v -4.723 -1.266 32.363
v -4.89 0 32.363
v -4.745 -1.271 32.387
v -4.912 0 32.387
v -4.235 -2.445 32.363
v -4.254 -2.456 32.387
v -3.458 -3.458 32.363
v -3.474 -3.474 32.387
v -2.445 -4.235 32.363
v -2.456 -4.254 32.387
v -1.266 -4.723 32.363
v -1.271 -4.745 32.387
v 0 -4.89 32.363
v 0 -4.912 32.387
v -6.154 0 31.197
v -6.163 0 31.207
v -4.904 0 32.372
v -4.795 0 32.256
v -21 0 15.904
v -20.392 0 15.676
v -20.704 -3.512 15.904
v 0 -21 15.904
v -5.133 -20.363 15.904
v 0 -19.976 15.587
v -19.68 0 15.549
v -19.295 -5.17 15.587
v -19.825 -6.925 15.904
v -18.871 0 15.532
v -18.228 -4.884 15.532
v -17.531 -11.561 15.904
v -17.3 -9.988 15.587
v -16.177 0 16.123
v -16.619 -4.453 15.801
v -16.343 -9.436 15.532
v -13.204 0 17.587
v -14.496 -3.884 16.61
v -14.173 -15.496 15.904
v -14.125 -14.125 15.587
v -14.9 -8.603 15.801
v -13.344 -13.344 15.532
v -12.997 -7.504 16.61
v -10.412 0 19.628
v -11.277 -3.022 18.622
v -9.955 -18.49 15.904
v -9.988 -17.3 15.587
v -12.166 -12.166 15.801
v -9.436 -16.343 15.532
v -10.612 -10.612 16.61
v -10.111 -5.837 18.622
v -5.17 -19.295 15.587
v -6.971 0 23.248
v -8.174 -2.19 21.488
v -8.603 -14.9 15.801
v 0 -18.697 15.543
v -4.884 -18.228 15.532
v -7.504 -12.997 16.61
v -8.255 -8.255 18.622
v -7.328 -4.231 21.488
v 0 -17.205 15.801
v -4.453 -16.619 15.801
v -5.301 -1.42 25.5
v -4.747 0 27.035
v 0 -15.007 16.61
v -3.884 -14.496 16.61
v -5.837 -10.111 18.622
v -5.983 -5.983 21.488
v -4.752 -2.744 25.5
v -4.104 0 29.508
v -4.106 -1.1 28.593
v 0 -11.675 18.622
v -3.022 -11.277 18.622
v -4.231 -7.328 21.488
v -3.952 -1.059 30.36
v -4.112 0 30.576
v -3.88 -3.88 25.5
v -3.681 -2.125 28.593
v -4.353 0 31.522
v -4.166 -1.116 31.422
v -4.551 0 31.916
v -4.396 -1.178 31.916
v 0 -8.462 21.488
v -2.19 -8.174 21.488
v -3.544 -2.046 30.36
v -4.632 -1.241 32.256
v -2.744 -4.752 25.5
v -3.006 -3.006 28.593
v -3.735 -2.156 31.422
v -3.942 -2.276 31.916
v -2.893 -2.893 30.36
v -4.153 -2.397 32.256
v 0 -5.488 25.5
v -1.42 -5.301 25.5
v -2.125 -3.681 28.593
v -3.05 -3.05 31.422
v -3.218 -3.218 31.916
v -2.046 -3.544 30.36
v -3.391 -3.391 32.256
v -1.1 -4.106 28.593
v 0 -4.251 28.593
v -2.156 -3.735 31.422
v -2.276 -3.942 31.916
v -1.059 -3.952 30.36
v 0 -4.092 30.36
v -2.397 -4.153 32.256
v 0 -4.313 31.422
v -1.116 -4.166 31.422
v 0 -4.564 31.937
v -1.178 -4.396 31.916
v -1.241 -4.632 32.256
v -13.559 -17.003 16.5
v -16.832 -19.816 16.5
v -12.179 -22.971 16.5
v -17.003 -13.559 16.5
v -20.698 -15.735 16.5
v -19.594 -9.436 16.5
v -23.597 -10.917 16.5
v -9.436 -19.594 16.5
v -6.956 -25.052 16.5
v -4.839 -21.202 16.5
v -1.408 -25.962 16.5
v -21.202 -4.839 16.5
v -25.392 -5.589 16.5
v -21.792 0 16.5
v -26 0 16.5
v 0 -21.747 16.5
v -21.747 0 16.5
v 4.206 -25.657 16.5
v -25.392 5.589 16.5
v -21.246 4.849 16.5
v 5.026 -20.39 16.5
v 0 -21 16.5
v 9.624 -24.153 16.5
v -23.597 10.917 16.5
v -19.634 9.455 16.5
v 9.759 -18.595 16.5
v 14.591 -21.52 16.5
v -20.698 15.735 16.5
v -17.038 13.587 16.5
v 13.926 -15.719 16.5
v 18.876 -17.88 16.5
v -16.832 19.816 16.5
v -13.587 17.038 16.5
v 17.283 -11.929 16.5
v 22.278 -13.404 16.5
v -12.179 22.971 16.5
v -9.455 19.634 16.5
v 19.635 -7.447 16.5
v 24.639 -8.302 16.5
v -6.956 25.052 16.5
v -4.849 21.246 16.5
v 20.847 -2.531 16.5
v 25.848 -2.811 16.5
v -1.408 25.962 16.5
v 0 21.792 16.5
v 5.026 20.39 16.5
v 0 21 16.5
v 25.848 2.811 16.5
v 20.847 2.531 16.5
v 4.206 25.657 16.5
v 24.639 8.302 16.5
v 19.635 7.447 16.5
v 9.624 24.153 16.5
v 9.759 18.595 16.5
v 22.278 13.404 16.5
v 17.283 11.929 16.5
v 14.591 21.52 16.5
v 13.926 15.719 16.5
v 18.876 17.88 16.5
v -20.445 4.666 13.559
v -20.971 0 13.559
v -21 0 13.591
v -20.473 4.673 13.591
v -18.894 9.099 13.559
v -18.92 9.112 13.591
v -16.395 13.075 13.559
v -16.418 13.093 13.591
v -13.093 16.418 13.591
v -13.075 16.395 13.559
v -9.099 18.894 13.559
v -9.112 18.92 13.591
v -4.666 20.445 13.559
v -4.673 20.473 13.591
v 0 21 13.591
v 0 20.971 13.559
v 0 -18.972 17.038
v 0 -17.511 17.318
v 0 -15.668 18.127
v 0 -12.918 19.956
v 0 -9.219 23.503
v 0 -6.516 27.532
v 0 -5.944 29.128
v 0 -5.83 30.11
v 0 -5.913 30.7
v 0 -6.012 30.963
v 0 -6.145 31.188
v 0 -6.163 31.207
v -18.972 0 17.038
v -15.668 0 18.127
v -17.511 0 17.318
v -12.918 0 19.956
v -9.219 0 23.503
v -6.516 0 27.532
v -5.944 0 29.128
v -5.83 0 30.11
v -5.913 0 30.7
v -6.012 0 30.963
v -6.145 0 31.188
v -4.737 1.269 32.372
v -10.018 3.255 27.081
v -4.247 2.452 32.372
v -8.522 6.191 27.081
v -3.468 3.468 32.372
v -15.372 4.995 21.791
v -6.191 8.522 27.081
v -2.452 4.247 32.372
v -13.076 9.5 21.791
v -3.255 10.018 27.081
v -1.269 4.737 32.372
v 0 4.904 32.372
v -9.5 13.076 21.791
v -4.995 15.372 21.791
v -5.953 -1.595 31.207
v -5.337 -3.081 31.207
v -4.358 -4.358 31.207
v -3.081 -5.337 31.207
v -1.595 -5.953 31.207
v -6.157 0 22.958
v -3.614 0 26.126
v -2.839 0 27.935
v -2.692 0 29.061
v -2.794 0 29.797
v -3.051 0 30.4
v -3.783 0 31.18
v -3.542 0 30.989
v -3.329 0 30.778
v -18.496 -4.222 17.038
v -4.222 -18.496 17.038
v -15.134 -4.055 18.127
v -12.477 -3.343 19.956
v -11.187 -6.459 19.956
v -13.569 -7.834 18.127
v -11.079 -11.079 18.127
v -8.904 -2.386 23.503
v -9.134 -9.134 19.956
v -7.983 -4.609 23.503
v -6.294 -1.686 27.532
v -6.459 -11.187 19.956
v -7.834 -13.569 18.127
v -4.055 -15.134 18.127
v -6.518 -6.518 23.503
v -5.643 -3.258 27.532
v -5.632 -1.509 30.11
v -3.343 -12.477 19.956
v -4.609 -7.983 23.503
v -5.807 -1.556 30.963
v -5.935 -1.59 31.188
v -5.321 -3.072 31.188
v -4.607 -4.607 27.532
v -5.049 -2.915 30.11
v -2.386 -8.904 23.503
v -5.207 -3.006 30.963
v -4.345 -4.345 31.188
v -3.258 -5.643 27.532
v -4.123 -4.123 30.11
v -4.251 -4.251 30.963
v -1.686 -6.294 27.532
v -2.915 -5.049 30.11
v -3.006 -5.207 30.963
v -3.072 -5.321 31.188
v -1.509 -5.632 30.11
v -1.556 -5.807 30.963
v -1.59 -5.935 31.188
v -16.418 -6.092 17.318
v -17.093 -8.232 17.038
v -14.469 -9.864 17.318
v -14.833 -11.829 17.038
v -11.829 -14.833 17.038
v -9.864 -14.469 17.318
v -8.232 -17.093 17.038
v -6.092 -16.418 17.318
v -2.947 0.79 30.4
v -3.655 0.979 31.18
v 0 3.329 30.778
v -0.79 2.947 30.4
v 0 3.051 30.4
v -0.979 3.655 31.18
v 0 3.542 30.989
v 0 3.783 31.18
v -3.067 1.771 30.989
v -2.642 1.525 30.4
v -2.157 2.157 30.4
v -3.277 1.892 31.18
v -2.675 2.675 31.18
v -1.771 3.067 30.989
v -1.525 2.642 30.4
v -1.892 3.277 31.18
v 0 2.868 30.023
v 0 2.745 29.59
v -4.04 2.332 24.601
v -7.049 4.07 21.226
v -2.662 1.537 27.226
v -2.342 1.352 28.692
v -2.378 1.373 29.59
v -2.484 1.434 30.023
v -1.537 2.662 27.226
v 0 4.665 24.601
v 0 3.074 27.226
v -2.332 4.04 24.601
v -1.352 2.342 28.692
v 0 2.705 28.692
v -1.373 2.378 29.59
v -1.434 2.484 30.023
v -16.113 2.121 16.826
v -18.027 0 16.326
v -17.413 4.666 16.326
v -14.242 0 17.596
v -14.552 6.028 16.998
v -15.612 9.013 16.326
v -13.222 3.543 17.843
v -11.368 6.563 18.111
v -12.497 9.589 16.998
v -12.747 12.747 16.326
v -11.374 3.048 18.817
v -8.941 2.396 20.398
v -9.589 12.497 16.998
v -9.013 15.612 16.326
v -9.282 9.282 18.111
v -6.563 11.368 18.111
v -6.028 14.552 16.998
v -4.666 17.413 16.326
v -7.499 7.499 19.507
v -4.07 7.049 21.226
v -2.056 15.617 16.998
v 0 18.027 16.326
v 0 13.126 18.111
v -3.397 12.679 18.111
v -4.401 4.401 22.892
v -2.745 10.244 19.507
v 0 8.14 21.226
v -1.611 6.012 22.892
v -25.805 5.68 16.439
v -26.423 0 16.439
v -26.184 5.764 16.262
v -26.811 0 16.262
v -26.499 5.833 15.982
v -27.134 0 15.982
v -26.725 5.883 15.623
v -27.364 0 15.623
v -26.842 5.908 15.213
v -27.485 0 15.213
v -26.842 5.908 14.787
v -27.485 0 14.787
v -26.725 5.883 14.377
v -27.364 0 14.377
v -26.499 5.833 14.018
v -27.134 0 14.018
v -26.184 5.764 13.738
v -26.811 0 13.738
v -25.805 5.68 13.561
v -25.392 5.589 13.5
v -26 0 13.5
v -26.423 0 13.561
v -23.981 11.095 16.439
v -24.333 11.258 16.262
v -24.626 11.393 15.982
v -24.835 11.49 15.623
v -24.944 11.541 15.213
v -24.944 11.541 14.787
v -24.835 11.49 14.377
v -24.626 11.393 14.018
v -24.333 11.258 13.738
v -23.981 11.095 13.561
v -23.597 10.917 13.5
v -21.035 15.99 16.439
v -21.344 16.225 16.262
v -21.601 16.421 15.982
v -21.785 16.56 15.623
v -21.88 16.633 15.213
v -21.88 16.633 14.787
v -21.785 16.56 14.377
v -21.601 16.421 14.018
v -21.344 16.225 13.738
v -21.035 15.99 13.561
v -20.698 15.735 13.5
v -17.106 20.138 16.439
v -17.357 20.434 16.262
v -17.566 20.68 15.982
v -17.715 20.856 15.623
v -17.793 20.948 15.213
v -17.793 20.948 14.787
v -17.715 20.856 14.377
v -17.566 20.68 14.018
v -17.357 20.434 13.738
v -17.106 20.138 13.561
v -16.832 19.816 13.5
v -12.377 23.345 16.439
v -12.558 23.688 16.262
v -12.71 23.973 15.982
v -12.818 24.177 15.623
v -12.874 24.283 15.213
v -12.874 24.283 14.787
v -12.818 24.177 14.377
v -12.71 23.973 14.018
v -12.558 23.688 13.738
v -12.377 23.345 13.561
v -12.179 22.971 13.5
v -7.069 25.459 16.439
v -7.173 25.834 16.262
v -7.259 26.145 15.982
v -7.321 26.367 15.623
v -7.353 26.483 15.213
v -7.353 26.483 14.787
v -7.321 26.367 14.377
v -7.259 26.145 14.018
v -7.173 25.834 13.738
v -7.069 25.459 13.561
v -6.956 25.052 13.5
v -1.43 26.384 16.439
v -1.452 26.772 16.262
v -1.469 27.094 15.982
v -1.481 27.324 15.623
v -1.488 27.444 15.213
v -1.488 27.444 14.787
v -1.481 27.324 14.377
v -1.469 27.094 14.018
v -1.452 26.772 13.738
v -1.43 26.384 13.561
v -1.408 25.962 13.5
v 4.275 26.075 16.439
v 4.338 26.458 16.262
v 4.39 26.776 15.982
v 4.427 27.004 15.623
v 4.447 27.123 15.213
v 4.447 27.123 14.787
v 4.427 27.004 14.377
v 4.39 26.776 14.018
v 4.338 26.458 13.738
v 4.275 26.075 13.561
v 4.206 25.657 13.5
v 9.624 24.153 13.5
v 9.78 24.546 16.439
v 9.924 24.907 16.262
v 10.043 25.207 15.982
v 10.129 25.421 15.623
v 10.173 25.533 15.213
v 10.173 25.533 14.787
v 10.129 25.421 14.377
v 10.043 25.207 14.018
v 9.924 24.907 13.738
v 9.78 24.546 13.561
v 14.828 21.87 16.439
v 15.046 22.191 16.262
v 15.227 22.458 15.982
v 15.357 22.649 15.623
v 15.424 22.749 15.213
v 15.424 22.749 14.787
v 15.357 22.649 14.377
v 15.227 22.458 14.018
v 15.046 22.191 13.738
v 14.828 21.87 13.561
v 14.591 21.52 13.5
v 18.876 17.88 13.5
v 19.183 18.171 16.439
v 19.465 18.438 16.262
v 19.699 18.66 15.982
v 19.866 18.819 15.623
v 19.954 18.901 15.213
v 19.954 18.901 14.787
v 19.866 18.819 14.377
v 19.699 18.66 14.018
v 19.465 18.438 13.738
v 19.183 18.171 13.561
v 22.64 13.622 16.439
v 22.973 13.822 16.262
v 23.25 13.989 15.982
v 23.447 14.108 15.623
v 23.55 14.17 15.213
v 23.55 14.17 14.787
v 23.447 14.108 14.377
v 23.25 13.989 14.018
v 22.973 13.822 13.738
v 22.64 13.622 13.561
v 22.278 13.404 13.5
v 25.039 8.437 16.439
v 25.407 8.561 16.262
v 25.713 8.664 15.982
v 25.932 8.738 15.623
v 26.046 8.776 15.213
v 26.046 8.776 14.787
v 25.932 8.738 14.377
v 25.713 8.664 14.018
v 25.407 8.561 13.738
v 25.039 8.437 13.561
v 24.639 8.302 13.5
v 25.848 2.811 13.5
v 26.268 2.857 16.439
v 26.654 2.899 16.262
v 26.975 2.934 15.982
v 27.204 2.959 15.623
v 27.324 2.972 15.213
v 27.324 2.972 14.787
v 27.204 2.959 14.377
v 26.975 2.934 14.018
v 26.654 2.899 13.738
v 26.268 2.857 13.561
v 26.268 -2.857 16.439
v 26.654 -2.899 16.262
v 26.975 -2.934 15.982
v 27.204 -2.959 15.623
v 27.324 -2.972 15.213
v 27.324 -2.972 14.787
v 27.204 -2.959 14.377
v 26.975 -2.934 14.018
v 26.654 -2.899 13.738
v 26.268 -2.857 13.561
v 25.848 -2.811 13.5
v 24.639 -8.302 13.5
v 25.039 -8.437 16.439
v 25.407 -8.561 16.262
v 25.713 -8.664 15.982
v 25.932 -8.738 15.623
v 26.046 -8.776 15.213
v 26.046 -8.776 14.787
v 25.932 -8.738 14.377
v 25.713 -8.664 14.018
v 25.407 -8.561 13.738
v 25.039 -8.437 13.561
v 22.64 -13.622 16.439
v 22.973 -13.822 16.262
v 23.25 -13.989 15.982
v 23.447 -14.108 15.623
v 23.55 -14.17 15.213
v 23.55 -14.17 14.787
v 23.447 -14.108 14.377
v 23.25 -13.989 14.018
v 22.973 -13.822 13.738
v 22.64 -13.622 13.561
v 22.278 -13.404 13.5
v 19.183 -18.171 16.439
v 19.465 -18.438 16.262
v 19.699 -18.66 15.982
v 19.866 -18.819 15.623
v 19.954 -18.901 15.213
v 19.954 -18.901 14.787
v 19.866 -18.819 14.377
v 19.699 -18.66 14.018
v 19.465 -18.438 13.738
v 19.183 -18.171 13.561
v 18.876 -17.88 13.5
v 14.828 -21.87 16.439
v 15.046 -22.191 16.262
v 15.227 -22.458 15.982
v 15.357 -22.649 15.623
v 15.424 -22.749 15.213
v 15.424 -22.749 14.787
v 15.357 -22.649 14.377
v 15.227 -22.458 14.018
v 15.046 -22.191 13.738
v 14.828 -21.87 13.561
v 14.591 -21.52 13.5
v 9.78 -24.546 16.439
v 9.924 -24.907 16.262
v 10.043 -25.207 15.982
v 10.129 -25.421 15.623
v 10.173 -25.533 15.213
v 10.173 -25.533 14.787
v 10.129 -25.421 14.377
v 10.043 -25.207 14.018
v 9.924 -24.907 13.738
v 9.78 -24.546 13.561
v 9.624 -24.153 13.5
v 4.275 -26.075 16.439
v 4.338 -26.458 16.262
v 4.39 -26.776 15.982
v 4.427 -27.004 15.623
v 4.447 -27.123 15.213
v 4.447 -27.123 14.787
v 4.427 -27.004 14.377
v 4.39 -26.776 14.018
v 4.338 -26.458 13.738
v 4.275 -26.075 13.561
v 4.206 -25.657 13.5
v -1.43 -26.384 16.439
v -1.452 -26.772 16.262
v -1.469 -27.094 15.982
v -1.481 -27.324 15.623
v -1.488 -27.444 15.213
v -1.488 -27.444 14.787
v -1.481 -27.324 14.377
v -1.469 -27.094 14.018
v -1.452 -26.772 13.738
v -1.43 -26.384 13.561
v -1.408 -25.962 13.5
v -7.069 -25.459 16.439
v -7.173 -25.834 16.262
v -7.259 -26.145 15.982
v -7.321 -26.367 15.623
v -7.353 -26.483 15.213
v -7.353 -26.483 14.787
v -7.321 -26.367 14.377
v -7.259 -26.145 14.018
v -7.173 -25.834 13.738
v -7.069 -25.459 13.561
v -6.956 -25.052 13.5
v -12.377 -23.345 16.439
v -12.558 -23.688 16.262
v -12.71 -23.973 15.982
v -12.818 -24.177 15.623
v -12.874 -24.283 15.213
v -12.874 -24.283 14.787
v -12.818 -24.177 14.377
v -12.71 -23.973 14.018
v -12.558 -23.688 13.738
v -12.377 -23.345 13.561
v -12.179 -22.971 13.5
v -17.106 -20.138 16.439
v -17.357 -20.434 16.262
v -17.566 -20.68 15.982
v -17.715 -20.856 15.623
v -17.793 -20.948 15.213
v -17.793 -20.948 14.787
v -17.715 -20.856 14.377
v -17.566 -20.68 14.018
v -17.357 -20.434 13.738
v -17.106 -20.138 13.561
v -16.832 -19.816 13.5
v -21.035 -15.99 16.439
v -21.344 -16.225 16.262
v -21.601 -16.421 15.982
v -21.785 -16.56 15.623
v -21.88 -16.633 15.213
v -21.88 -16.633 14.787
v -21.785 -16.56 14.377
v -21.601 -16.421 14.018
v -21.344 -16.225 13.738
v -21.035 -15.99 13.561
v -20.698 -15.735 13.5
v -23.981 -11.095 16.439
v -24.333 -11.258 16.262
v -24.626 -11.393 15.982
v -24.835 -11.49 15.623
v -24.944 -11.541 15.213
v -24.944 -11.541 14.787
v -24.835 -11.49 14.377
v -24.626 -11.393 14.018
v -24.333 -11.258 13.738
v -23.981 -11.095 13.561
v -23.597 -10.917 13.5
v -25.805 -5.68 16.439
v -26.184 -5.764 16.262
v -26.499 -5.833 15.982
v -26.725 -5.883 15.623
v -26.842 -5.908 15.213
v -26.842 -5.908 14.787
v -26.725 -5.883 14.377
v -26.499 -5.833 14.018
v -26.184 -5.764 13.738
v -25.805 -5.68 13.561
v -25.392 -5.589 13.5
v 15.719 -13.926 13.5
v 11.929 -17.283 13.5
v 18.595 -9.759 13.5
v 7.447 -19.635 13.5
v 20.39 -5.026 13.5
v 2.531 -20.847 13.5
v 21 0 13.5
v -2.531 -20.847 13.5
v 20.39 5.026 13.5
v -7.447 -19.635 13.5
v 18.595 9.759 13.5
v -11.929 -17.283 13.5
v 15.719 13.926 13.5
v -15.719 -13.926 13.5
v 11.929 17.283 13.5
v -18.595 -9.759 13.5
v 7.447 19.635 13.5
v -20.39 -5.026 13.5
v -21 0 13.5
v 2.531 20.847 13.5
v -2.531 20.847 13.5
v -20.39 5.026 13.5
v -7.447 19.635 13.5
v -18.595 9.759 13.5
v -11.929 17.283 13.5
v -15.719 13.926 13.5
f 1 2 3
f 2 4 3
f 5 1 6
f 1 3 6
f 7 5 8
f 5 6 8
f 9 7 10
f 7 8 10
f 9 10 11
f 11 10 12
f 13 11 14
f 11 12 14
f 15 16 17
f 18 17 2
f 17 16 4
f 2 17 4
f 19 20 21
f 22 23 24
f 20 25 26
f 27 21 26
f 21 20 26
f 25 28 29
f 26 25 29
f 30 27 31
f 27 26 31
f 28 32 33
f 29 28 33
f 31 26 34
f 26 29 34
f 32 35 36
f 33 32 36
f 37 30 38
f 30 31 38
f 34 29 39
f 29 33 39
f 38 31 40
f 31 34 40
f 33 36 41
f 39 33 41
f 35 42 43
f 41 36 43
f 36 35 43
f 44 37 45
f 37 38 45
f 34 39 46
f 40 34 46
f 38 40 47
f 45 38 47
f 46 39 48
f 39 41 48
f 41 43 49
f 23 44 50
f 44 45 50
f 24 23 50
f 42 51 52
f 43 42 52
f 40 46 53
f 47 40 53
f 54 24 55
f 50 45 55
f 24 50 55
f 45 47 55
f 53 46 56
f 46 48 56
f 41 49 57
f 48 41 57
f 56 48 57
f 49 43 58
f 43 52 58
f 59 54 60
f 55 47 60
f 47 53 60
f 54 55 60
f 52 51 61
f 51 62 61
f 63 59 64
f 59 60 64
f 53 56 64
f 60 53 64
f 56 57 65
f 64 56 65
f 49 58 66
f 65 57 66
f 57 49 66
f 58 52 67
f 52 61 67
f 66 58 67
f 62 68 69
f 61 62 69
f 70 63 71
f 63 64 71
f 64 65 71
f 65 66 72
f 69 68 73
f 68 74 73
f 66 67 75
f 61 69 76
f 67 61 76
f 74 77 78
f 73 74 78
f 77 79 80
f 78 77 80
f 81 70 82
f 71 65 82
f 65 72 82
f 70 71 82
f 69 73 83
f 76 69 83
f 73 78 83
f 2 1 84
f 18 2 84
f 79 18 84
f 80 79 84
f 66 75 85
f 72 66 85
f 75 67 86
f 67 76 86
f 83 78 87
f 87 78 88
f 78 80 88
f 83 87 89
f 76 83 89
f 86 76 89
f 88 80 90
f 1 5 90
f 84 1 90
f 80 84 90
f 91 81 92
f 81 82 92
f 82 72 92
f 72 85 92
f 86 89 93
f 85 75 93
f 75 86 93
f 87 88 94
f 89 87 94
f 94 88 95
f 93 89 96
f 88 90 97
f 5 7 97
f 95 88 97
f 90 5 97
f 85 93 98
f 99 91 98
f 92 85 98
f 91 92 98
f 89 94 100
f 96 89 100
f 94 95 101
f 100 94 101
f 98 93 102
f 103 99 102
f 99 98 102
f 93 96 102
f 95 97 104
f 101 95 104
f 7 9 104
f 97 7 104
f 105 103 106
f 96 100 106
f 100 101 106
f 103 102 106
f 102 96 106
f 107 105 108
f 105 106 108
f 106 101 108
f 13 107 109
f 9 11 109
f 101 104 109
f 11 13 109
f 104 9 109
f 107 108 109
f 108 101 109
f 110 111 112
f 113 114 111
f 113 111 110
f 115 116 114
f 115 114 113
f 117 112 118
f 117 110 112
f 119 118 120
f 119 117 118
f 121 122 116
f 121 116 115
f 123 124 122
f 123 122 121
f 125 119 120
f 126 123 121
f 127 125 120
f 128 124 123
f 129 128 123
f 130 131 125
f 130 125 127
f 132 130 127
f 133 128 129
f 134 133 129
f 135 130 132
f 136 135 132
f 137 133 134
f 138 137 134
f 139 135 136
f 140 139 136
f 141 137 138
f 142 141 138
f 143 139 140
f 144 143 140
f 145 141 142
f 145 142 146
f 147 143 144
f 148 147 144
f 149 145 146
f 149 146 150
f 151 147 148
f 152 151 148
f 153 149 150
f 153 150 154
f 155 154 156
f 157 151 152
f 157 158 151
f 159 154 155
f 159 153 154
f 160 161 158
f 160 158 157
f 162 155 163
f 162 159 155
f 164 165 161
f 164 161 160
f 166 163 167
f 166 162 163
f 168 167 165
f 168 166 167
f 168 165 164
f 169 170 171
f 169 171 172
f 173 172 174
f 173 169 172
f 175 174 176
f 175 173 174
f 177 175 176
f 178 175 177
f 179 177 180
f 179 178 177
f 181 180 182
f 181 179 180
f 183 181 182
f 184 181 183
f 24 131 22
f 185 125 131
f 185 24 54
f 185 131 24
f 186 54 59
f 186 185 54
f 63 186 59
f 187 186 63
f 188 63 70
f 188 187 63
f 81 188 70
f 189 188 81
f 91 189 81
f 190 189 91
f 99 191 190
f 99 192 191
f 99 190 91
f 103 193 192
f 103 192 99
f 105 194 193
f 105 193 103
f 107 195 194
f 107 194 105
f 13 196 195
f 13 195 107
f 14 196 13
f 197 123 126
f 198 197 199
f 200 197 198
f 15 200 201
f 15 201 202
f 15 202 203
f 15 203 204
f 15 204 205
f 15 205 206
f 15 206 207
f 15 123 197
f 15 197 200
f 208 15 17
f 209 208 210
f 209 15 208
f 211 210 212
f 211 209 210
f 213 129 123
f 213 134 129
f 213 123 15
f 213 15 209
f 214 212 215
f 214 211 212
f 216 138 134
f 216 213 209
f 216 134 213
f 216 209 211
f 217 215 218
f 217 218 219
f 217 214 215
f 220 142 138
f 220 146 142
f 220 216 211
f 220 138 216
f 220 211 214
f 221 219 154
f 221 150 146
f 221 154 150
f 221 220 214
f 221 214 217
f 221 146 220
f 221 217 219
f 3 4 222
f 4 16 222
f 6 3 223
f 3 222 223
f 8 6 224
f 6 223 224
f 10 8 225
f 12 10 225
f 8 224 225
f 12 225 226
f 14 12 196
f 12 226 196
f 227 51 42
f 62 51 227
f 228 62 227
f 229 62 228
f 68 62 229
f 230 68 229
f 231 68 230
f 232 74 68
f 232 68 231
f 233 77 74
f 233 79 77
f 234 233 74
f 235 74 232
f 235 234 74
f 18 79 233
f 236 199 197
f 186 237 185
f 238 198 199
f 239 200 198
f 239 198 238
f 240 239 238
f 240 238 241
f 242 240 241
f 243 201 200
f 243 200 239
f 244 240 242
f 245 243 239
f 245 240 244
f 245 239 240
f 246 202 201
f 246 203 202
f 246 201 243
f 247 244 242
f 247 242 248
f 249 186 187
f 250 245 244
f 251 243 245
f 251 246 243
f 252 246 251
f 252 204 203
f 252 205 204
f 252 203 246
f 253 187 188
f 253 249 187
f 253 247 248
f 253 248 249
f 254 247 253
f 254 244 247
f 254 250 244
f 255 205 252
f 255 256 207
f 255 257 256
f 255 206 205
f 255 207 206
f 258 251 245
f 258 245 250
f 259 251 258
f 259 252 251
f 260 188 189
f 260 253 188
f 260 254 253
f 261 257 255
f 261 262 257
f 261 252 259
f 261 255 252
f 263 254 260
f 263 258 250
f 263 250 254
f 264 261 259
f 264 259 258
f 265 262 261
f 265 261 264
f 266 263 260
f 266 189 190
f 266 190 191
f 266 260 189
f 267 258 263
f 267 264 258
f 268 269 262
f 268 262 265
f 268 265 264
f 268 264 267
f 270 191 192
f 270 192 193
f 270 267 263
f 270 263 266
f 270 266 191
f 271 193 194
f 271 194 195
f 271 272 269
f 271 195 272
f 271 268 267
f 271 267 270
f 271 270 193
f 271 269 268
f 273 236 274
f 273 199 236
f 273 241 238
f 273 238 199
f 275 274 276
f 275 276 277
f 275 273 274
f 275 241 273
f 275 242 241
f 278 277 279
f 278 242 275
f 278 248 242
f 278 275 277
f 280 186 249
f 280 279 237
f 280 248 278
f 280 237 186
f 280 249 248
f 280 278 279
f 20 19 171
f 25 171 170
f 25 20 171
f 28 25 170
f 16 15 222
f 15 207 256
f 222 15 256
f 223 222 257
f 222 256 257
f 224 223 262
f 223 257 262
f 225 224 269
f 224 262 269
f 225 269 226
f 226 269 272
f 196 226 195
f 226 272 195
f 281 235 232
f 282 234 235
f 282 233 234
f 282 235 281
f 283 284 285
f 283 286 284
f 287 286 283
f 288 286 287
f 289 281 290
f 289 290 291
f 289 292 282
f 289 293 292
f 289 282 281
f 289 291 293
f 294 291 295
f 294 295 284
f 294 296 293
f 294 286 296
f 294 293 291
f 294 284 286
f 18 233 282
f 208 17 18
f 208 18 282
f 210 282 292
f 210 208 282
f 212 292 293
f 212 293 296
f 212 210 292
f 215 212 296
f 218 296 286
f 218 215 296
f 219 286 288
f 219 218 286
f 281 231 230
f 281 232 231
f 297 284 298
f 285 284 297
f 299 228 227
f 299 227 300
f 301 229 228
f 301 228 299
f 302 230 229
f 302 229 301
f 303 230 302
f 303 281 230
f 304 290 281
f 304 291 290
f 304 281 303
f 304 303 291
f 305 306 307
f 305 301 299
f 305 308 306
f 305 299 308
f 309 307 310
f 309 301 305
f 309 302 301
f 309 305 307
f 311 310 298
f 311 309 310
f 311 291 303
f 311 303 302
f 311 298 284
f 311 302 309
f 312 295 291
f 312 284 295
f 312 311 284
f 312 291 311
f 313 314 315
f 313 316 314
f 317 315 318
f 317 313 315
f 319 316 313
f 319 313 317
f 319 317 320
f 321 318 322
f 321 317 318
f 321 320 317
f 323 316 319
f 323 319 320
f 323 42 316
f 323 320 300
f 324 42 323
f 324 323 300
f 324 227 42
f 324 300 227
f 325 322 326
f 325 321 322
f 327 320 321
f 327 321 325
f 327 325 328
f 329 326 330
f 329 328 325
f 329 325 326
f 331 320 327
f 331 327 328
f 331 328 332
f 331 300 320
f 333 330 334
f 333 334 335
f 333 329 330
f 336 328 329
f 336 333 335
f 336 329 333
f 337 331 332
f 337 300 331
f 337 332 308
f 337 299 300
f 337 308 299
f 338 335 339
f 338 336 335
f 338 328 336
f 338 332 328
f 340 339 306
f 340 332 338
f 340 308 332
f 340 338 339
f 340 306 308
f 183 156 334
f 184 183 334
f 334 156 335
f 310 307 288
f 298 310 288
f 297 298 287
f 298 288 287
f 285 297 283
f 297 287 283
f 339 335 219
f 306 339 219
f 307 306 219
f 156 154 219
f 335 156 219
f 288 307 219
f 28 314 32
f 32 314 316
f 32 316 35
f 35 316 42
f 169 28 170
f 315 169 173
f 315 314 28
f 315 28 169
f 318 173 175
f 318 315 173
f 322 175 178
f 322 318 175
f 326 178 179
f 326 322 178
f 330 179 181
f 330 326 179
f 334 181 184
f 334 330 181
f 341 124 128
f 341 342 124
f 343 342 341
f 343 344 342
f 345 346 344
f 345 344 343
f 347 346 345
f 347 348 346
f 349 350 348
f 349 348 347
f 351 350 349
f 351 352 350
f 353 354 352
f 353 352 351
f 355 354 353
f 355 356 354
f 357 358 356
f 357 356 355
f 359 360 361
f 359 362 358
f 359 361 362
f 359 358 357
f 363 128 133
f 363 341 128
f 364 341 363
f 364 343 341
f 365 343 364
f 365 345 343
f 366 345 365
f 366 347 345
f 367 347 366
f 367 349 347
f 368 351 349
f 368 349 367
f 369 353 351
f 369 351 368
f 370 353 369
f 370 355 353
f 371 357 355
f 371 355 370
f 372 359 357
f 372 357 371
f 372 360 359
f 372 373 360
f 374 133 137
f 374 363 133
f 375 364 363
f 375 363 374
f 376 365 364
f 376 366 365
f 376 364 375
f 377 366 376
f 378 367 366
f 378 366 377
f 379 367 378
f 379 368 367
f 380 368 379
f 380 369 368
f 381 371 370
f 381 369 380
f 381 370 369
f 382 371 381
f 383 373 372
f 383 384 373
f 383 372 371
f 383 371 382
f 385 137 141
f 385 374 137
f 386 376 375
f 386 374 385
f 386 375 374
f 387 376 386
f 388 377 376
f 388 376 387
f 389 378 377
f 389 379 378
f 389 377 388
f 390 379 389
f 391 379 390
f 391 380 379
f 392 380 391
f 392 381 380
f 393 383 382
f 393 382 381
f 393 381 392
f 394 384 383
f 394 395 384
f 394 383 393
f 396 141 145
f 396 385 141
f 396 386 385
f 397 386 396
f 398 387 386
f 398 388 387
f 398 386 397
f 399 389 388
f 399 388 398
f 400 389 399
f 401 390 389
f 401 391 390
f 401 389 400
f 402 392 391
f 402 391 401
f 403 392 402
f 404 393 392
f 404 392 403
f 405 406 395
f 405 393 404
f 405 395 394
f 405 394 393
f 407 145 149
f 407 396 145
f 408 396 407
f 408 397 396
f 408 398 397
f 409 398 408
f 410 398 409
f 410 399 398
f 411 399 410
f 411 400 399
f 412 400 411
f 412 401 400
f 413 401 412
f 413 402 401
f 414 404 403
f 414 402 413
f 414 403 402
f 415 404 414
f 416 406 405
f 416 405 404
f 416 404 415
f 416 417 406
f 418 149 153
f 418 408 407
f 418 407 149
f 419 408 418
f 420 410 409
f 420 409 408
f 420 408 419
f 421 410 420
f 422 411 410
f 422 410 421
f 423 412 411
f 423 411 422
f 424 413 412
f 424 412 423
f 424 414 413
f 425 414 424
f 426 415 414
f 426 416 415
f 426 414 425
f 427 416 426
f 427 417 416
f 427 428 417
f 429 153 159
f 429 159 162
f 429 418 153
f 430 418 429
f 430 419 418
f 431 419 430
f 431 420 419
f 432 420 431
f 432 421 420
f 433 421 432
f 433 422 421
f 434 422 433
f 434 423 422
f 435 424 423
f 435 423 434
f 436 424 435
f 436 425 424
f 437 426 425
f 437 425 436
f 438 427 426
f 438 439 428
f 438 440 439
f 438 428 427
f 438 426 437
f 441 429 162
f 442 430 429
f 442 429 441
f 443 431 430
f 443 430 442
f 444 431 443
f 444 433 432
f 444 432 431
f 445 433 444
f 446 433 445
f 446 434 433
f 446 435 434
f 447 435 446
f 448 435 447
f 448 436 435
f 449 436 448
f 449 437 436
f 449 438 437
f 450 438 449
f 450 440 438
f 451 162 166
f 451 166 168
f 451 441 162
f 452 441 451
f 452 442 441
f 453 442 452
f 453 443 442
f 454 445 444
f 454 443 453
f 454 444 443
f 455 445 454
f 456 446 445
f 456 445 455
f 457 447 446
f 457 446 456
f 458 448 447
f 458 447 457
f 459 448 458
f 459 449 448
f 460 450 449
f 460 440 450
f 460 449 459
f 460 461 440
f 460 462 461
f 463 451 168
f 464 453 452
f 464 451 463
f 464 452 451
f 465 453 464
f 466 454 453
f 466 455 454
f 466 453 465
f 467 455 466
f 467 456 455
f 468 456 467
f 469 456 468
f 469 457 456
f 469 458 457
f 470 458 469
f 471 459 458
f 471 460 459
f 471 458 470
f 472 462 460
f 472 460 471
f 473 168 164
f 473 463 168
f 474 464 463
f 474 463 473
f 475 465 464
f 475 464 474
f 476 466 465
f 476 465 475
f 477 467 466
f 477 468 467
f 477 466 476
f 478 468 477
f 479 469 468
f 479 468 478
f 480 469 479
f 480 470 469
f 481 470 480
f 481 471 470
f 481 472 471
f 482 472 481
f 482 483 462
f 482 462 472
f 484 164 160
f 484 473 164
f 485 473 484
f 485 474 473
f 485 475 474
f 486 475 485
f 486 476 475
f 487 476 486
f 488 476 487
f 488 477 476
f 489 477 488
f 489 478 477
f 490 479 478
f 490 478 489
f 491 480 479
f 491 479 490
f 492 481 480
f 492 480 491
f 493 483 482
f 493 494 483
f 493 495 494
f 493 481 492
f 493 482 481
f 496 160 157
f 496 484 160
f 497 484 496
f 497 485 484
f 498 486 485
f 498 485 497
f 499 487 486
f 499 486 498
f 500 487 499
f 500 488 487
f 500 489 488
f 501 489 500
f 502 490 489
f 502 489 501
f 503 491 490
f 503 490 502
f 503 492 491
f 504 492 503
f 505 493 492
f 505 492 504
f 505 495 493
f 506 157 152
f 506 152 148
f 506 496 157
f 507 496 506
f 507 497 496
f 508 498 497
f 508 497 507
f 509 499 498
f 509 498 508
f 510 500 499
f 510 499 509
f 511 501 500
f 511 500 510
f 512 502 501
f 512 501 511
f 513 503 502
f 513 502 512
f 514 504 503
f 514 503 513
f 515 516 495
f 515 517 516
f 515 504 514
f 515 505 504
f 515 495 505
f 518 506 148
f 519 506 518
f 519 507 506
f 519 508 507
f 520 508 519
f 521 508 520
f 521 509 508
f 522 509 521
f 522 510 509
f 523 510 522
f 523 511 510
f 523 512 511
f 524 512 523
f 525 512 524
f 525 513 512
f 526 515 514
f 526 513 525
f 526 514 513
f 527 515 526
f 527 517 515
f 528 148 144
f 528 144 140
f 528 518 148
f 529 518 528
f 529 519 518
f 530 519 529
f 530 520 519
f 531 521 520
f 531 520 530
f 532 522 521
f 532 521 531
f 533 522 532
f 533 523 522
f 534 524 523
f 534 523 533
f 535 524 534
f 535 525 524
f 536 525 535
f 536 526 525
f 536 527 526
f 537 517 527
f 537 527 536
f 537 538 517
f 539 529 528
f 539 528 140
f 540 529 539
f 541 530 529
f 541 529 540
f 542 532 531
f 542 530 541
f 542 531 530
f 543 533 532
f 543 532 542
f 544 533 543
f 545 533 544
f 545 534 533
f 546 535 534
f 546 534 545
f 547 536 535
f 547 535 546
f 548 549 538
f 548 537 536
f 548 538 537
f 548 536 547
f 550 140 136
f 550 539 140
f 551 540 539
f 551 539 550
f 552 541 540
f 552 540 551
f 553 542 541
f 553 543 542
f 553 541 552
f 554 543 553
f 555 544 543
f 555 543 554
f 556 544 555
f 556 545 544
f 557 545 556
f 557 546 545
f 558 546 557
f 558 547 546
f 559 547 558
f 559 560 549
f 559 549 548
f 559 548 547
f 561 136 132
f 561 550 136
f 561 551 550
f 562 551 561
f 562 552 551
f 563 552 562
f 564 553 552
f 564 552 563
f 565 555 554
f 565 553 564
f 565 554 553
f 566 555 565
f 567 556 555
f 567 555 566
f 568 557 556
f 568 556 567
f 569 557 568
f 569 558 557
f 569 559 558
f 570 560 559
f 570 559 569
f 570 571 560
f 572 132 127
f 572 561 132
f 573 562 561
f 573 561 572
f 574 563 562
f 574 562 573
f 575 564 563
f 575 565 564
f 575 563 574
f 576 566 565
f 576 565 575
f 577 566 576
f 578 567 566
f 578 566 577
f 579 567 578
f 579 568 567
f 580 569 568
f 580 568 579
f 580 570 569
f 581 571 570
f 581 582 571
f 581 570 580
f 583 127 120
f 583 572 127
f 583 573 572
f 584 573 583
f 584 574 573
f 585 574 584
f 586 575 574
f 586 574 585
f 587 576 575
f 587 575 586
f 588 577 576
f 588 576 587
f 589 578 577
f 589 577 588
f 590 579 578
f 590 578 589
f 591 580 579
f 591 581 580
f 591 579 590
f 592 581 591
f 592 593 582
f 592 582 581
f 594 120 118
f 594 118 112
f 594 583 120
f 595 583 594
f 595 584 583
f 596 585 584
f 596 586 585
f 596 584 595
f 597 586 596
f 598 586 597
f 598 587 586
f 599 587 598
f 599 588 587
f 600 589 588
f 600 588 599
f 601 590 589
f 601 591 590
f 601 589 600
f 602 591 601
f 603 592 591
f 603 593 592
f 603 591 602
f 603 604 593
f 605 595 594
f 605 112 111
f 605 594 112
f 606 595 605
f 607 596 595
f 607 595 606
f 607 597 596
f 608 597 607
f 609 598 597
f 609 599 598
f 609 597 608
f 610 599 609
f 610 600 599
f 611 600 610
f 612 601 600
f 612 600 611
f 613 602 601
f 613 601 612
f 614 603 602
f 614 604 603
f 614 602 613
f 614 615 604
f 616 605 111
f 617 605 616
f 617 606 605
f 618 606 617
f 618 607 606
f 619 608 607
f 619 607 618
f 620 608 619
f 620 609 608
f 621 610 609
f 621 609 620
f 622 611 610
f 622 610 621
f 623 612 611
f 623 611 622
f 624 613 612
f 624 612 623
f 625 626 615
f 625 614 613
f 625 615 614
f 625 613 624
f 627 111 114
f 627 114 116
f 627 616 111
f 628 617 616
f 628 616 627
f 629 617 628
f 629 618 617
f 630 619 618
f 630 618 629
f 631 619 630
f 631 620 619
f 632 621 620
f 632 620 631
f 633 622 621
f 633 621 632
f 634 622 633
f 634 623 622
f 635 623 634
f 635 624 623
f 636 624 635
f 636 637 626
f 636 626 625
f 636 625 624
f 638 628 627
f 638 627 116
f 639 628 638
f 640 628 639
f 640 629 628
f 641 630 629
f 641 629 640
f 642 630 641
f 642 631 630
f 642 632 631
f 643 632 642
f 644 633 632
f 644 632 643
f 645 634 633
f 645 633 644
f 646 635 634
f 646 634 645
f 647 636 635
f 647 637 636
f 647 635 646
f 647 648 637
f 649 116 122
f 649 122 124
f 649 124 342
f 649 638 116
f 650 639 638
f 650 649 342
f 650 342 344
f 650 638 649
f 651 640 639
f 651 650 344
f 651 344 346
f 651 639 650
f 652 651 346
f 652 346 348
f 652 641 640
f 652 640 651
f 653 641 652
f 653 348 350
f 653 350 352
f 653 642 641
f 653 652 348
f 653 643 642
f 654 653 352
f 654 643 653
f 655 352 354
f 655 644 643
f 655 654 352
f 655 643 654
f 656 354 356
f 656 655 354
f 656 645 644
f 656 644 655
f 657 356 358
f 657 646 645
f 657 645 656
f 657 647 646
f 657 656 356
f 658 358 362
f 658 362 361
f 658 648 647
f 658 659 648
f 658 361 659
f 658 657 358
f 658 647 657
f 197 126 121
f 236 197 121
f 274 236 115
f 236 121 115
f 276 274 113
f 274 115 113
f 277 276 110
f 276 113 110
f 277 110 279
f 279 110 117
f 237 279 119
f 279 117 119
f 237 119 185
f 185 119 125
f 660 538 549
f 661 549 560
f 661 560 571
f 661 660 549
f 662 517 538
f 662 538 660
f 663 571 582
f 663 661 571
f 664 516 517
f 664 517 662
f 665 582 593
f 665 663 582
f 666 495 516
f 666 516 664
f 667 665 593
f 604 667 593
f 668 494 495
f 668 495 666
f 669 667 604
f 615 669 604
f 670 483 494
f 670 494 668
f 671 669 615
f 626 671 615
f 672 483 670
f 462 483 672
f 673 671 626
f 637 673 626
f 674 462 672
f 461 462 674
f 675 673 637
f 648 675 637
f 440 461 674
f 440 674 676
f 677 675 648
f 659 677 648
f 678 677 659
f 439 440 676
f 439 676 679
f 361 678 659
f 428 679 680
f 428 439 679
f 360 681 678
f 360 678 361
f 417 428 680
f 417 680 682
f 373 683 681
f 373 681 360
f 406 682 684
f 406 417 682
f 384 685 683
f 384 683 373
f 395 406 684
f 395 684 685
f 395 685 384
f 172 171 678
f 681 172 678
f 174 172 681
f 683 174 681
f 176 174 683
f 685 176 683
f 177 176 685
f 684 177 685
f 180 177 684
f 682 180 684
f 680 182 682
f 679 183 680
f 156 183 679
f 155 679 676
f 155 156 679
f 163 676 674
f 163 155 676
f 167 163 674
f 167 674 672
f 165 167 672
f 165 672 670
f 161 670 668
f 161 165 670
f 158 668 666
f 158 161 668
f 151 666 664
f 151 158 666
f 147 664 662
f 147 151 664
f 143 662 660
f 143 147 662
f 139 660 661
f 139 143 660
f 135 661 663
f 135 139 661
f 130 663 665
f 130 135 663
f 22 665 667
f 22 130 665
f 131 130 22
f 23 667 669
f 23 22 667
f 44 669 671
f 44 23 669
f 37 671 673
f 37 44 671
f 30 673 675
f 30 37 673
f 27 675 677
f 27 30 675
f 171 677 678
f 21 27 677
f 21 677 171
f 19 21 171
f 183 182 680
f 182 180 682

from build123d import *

# Parameters (mm, degrees)
F3_ANGLE = 90
F5_ANGLE = 90


with BuildPart() as f1:
    # F0 (on Front) → F1 (revolve)
    with BuildSketch(Plane.XZ):
        with BuildLine():
            Line((-21, 16.5), (-26, 16.5))
            ThreePointArc((-26, 16.5), (-27.5, 15), (-26, 13.5))
            Line((-26, 13.5), (-21, 13.5))
            Line((-21, 13.5), (-21, 16.5))
        make_face()
    revolve(axis=Axis((0, 0, 12.5856157392), (0, 0, -1)))

    # F2 (on Front) → F3 (revolve)
    with BuildSketch(Plane.XZ):
        with BuildLine():
            Line((-22.8234108924, 15.5310801728), (-20.9705103189, 13.5594885796))
            Line((-20.9705103189, 13.5594885796), (-18.0268532264, 16.3259357148))
            add(Edge.make_bspline(
                [(-18.0268532264, 16.3259357148), (2.5248612882, 21.0512280006), (-3.0509901699, 30.4002426565)],
                knots=[4.0760424662, 4.0760424662, 4.0760424662, 6.2831853072, 6.2831853072, 6.2831853072], degree=2, weights=[1, 0.4504103592, 1]))
            Line((-3.0509901699, 30.4002426565), (-3.7834591359, 31.1796312952))
            Line((-3.7834591359, 31.1796312952), (-4.9038907434, 32.3718342497))
            Line((-4.9038907434, 32.3718342497), (-22.8234108924, 15.5310801728))
        make_face()
        with BuildLine():
            Line((-3.7834591359, 31.1796312952), (-3.0509901699, 30.4002426565))
            add(Edge.make_bspline(
                [(-3.0509901699, 30.4002426565), (-3.3209830741, 30.8529390092), (-3.7834591359, 31.1796312952)],
                knots=[0, 0, 0, 0.1913811194, 0.1913811194, 0.1913811194], degree=2, weights=[1, 0.9954251509, 1]))
        make_face()
    revolve(axis=Axis((0, 0, 24.1673644632), (0, 0, -1)), revolution_arc=F3_ANGLE)

    # F4 (on Front) → F5 (revolve)
    with BuildSketch(Plane.XZ):
        with BuildLine():
            Line((-4.9122721049, 32.3865450188), (-6.1626020759, 31.2069066763))
            Line((-6.1626020759, 31.2069066763), (-6.1446281649, 31.1877814126))
            add(Edge.make_bspline(
                [(-18.9718568385, 17.0376612359), (-14.9669974913, 17.146964893), (-9.6910325347, 22.9670480991), (-4.4150675782, 28.7871313051), (-6.1446281649, 31.1877814126)],
                knots=[3.5205813128, 3.5205813128, 3.5205813128, 4.8740420257, 4.8740420257, 6.2275027386, 6.2275027386, 6.2275027386], degree=2, weights=[1, 0.7796244878, 1, 0.7796244878, 1]))
            Line((-18.9718568385, 17.0376612359), (-21.7830147594, 16.4930532639))
            Line((-21.7830147594, 16.4930532639), (-21.7830147594, 16.4715316409))
            add(Edge.make_bspline(
                [(-21.7830147594, 16.4715316409), (-17.9606831235, 12.4873048362), (-9.5363391364, 20.4118410334), (-1.1119951493, 28.3363772305), (-4.8897280053, 32.3625568147)],
                knots=[0.0052940421, 0.0052940421, 0.0052940421, 1.5734433479, 1.5734433479, 3.1415926536, 3.1415926536, 3.1415926536], degree=2, weights=[1, 0.7080420249, 1, 0.7080420249, 1]))
            Line((-4.8897280053, 32.3625568147), (-4.9122721049, 32.3865450188))
        make_face()
    revolve(axis=Axis((0, 0, 25.1945196651), (0, 0, 1)), revolution_arc=F5_ANGLE)


solid = f1.part
